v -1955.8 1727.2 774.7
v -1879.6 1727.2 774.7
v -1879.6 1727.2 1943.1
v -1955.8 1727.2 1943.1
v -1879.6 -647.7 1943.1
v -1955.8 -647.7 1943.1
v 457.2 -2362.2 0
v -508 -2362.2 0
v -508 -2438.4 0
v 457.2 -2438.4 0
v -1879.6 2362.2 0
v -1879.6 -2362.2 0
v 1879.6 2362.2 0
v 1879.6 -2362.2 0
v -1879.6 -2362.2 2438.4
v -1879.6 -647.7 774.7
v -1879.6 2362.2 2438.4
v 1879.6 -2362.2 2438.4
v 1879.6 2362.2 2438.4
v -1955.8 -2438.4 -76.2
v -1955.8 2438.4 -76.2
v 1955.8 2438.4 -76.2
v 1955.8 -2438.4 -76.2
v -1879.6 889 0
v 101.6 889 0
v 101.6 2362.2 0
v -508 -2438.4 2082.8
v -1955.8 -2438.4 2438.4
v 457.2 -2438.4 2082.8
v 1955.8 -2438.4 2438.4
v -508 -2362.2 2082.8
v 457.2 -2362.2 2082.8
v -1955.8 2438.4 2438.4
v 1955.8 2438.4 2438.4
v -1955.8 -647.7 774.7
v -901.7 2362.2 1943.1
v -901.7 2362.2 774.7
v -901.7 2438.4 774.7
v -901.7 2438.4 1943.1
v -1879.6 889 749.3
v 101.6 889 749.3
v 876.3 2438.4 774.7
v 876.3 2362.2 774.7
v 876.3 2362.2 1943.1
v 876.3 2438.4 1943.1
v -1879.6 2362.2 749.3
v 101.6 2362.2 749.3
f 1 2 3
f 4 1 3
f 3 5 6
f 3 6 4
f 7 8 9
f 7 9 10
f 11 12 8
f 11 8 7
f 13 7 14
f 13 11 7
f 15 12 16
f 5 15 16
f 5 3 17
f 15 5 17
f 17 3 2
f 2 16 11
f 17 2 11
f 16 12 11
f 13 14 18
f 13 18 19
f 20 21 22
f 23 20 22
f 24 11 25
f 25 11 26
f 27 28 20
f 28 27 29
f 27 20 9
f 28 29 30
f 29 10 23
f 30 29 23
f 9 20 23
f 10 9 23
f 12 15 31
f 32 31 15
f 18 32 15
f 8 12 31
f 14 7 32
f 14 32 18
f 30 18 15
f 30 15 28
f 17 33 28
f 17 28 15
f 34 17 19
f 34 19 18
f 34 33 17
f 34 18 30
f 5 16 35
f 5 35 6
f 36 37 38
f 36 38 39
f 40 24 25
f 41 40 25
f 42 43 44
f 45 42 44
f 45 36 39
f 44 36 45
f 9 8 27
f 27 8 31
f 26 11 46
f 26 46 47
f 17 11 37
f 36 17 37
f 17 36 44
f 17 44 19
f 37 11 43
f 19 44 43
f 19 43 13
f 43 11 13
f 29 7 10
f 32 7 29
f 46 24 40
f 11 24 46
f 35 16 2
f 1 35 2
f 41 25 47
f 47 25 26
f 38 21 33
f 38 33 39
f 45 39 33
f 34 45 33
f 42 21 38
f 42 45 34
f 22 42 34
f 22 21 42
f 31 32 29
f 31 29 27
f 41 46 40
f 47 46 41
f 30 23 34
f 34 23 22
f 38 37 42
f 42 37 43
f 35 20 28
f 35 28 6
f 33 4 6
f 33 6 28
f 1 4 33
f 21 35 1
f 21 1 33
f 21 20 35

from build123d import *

# Parameters (mm, degrees)
F0_W      = 3759.2
F0_H      = 4724.4
F1_DEPTH  = 2438.4
F2_T      = 76.2
F3_W      = 965.2
F3_H      = 2082.8
F4_DEPTH  = 76.201
F5_W      = 2374.9
F5_H      = 1168.4
F6_DEPTH  = 76.201
F7_W      = 1778
F7_H      = 1168.4
F8_DEPTH  = 76.201
F9_W      = 1981.2
F9_H      = 1473.2
F10_DEPTH = 749.3


with BuildPart() as f1:
    # F0 (on Top) → F1 (new body)
    with BuildSketch(Plane.XY):
        Rectangle(F0_W, F0_H)
    extrude(amount=F1_DEPTH)

    # F2
    f2_openings = [f1.faces().sort_by_distance(p)[0] for p in [
        (0, 0, 2438.4),
    ]]
    offset(amount=F2_T, openings=f2_openings, kind=Kind.INTERSECTION)

    # F3 (on face) → F4 (cut, through all)
    with BuildSketch(Plane(origin=(0, -2362.2, 0), x_dir=(-1, 0, 0), z_dir=(0, 1, 0))):
        with Locations((25.4, 1041.4)):
            Rectangle(F3_W, F3_H)
    extrude(amount=-F4_DEPTH, mode=Mode.SUBTRACT)

    # F5 (on face) → F6 (cut, through all)
    with BuildSketch(Plane.YZ.offset(-1879.6)):
        with Locations((539.75, 1358.9)):
            Rectangle(F5_W, F5_H)
    extrude(amount=-F6_DEPTH, mode=Mode.SUBTRACT)

    # F7 (on face) → F8 (cut, through all)
    with BuildSketch(Plane.XZ.offset(-2362.2)):
        with Locations((-12.7, 1358.9)):
            Rectangle(F7_W, F7_H)
    extrude(amount=-F8_DEPTH, mode=Mode.SUBTRACT)


with BuildPart() as f10:
    # F9 (on face) → F10 (new body)
    with BuildSketch(Plane.XY):
        with Locations((-889, 1625.6)):
            Rectangle(F9_W, F9_H)
    extrude(amount=F10_DEPTH)


solid = Compound([f1.part, f10.part])
